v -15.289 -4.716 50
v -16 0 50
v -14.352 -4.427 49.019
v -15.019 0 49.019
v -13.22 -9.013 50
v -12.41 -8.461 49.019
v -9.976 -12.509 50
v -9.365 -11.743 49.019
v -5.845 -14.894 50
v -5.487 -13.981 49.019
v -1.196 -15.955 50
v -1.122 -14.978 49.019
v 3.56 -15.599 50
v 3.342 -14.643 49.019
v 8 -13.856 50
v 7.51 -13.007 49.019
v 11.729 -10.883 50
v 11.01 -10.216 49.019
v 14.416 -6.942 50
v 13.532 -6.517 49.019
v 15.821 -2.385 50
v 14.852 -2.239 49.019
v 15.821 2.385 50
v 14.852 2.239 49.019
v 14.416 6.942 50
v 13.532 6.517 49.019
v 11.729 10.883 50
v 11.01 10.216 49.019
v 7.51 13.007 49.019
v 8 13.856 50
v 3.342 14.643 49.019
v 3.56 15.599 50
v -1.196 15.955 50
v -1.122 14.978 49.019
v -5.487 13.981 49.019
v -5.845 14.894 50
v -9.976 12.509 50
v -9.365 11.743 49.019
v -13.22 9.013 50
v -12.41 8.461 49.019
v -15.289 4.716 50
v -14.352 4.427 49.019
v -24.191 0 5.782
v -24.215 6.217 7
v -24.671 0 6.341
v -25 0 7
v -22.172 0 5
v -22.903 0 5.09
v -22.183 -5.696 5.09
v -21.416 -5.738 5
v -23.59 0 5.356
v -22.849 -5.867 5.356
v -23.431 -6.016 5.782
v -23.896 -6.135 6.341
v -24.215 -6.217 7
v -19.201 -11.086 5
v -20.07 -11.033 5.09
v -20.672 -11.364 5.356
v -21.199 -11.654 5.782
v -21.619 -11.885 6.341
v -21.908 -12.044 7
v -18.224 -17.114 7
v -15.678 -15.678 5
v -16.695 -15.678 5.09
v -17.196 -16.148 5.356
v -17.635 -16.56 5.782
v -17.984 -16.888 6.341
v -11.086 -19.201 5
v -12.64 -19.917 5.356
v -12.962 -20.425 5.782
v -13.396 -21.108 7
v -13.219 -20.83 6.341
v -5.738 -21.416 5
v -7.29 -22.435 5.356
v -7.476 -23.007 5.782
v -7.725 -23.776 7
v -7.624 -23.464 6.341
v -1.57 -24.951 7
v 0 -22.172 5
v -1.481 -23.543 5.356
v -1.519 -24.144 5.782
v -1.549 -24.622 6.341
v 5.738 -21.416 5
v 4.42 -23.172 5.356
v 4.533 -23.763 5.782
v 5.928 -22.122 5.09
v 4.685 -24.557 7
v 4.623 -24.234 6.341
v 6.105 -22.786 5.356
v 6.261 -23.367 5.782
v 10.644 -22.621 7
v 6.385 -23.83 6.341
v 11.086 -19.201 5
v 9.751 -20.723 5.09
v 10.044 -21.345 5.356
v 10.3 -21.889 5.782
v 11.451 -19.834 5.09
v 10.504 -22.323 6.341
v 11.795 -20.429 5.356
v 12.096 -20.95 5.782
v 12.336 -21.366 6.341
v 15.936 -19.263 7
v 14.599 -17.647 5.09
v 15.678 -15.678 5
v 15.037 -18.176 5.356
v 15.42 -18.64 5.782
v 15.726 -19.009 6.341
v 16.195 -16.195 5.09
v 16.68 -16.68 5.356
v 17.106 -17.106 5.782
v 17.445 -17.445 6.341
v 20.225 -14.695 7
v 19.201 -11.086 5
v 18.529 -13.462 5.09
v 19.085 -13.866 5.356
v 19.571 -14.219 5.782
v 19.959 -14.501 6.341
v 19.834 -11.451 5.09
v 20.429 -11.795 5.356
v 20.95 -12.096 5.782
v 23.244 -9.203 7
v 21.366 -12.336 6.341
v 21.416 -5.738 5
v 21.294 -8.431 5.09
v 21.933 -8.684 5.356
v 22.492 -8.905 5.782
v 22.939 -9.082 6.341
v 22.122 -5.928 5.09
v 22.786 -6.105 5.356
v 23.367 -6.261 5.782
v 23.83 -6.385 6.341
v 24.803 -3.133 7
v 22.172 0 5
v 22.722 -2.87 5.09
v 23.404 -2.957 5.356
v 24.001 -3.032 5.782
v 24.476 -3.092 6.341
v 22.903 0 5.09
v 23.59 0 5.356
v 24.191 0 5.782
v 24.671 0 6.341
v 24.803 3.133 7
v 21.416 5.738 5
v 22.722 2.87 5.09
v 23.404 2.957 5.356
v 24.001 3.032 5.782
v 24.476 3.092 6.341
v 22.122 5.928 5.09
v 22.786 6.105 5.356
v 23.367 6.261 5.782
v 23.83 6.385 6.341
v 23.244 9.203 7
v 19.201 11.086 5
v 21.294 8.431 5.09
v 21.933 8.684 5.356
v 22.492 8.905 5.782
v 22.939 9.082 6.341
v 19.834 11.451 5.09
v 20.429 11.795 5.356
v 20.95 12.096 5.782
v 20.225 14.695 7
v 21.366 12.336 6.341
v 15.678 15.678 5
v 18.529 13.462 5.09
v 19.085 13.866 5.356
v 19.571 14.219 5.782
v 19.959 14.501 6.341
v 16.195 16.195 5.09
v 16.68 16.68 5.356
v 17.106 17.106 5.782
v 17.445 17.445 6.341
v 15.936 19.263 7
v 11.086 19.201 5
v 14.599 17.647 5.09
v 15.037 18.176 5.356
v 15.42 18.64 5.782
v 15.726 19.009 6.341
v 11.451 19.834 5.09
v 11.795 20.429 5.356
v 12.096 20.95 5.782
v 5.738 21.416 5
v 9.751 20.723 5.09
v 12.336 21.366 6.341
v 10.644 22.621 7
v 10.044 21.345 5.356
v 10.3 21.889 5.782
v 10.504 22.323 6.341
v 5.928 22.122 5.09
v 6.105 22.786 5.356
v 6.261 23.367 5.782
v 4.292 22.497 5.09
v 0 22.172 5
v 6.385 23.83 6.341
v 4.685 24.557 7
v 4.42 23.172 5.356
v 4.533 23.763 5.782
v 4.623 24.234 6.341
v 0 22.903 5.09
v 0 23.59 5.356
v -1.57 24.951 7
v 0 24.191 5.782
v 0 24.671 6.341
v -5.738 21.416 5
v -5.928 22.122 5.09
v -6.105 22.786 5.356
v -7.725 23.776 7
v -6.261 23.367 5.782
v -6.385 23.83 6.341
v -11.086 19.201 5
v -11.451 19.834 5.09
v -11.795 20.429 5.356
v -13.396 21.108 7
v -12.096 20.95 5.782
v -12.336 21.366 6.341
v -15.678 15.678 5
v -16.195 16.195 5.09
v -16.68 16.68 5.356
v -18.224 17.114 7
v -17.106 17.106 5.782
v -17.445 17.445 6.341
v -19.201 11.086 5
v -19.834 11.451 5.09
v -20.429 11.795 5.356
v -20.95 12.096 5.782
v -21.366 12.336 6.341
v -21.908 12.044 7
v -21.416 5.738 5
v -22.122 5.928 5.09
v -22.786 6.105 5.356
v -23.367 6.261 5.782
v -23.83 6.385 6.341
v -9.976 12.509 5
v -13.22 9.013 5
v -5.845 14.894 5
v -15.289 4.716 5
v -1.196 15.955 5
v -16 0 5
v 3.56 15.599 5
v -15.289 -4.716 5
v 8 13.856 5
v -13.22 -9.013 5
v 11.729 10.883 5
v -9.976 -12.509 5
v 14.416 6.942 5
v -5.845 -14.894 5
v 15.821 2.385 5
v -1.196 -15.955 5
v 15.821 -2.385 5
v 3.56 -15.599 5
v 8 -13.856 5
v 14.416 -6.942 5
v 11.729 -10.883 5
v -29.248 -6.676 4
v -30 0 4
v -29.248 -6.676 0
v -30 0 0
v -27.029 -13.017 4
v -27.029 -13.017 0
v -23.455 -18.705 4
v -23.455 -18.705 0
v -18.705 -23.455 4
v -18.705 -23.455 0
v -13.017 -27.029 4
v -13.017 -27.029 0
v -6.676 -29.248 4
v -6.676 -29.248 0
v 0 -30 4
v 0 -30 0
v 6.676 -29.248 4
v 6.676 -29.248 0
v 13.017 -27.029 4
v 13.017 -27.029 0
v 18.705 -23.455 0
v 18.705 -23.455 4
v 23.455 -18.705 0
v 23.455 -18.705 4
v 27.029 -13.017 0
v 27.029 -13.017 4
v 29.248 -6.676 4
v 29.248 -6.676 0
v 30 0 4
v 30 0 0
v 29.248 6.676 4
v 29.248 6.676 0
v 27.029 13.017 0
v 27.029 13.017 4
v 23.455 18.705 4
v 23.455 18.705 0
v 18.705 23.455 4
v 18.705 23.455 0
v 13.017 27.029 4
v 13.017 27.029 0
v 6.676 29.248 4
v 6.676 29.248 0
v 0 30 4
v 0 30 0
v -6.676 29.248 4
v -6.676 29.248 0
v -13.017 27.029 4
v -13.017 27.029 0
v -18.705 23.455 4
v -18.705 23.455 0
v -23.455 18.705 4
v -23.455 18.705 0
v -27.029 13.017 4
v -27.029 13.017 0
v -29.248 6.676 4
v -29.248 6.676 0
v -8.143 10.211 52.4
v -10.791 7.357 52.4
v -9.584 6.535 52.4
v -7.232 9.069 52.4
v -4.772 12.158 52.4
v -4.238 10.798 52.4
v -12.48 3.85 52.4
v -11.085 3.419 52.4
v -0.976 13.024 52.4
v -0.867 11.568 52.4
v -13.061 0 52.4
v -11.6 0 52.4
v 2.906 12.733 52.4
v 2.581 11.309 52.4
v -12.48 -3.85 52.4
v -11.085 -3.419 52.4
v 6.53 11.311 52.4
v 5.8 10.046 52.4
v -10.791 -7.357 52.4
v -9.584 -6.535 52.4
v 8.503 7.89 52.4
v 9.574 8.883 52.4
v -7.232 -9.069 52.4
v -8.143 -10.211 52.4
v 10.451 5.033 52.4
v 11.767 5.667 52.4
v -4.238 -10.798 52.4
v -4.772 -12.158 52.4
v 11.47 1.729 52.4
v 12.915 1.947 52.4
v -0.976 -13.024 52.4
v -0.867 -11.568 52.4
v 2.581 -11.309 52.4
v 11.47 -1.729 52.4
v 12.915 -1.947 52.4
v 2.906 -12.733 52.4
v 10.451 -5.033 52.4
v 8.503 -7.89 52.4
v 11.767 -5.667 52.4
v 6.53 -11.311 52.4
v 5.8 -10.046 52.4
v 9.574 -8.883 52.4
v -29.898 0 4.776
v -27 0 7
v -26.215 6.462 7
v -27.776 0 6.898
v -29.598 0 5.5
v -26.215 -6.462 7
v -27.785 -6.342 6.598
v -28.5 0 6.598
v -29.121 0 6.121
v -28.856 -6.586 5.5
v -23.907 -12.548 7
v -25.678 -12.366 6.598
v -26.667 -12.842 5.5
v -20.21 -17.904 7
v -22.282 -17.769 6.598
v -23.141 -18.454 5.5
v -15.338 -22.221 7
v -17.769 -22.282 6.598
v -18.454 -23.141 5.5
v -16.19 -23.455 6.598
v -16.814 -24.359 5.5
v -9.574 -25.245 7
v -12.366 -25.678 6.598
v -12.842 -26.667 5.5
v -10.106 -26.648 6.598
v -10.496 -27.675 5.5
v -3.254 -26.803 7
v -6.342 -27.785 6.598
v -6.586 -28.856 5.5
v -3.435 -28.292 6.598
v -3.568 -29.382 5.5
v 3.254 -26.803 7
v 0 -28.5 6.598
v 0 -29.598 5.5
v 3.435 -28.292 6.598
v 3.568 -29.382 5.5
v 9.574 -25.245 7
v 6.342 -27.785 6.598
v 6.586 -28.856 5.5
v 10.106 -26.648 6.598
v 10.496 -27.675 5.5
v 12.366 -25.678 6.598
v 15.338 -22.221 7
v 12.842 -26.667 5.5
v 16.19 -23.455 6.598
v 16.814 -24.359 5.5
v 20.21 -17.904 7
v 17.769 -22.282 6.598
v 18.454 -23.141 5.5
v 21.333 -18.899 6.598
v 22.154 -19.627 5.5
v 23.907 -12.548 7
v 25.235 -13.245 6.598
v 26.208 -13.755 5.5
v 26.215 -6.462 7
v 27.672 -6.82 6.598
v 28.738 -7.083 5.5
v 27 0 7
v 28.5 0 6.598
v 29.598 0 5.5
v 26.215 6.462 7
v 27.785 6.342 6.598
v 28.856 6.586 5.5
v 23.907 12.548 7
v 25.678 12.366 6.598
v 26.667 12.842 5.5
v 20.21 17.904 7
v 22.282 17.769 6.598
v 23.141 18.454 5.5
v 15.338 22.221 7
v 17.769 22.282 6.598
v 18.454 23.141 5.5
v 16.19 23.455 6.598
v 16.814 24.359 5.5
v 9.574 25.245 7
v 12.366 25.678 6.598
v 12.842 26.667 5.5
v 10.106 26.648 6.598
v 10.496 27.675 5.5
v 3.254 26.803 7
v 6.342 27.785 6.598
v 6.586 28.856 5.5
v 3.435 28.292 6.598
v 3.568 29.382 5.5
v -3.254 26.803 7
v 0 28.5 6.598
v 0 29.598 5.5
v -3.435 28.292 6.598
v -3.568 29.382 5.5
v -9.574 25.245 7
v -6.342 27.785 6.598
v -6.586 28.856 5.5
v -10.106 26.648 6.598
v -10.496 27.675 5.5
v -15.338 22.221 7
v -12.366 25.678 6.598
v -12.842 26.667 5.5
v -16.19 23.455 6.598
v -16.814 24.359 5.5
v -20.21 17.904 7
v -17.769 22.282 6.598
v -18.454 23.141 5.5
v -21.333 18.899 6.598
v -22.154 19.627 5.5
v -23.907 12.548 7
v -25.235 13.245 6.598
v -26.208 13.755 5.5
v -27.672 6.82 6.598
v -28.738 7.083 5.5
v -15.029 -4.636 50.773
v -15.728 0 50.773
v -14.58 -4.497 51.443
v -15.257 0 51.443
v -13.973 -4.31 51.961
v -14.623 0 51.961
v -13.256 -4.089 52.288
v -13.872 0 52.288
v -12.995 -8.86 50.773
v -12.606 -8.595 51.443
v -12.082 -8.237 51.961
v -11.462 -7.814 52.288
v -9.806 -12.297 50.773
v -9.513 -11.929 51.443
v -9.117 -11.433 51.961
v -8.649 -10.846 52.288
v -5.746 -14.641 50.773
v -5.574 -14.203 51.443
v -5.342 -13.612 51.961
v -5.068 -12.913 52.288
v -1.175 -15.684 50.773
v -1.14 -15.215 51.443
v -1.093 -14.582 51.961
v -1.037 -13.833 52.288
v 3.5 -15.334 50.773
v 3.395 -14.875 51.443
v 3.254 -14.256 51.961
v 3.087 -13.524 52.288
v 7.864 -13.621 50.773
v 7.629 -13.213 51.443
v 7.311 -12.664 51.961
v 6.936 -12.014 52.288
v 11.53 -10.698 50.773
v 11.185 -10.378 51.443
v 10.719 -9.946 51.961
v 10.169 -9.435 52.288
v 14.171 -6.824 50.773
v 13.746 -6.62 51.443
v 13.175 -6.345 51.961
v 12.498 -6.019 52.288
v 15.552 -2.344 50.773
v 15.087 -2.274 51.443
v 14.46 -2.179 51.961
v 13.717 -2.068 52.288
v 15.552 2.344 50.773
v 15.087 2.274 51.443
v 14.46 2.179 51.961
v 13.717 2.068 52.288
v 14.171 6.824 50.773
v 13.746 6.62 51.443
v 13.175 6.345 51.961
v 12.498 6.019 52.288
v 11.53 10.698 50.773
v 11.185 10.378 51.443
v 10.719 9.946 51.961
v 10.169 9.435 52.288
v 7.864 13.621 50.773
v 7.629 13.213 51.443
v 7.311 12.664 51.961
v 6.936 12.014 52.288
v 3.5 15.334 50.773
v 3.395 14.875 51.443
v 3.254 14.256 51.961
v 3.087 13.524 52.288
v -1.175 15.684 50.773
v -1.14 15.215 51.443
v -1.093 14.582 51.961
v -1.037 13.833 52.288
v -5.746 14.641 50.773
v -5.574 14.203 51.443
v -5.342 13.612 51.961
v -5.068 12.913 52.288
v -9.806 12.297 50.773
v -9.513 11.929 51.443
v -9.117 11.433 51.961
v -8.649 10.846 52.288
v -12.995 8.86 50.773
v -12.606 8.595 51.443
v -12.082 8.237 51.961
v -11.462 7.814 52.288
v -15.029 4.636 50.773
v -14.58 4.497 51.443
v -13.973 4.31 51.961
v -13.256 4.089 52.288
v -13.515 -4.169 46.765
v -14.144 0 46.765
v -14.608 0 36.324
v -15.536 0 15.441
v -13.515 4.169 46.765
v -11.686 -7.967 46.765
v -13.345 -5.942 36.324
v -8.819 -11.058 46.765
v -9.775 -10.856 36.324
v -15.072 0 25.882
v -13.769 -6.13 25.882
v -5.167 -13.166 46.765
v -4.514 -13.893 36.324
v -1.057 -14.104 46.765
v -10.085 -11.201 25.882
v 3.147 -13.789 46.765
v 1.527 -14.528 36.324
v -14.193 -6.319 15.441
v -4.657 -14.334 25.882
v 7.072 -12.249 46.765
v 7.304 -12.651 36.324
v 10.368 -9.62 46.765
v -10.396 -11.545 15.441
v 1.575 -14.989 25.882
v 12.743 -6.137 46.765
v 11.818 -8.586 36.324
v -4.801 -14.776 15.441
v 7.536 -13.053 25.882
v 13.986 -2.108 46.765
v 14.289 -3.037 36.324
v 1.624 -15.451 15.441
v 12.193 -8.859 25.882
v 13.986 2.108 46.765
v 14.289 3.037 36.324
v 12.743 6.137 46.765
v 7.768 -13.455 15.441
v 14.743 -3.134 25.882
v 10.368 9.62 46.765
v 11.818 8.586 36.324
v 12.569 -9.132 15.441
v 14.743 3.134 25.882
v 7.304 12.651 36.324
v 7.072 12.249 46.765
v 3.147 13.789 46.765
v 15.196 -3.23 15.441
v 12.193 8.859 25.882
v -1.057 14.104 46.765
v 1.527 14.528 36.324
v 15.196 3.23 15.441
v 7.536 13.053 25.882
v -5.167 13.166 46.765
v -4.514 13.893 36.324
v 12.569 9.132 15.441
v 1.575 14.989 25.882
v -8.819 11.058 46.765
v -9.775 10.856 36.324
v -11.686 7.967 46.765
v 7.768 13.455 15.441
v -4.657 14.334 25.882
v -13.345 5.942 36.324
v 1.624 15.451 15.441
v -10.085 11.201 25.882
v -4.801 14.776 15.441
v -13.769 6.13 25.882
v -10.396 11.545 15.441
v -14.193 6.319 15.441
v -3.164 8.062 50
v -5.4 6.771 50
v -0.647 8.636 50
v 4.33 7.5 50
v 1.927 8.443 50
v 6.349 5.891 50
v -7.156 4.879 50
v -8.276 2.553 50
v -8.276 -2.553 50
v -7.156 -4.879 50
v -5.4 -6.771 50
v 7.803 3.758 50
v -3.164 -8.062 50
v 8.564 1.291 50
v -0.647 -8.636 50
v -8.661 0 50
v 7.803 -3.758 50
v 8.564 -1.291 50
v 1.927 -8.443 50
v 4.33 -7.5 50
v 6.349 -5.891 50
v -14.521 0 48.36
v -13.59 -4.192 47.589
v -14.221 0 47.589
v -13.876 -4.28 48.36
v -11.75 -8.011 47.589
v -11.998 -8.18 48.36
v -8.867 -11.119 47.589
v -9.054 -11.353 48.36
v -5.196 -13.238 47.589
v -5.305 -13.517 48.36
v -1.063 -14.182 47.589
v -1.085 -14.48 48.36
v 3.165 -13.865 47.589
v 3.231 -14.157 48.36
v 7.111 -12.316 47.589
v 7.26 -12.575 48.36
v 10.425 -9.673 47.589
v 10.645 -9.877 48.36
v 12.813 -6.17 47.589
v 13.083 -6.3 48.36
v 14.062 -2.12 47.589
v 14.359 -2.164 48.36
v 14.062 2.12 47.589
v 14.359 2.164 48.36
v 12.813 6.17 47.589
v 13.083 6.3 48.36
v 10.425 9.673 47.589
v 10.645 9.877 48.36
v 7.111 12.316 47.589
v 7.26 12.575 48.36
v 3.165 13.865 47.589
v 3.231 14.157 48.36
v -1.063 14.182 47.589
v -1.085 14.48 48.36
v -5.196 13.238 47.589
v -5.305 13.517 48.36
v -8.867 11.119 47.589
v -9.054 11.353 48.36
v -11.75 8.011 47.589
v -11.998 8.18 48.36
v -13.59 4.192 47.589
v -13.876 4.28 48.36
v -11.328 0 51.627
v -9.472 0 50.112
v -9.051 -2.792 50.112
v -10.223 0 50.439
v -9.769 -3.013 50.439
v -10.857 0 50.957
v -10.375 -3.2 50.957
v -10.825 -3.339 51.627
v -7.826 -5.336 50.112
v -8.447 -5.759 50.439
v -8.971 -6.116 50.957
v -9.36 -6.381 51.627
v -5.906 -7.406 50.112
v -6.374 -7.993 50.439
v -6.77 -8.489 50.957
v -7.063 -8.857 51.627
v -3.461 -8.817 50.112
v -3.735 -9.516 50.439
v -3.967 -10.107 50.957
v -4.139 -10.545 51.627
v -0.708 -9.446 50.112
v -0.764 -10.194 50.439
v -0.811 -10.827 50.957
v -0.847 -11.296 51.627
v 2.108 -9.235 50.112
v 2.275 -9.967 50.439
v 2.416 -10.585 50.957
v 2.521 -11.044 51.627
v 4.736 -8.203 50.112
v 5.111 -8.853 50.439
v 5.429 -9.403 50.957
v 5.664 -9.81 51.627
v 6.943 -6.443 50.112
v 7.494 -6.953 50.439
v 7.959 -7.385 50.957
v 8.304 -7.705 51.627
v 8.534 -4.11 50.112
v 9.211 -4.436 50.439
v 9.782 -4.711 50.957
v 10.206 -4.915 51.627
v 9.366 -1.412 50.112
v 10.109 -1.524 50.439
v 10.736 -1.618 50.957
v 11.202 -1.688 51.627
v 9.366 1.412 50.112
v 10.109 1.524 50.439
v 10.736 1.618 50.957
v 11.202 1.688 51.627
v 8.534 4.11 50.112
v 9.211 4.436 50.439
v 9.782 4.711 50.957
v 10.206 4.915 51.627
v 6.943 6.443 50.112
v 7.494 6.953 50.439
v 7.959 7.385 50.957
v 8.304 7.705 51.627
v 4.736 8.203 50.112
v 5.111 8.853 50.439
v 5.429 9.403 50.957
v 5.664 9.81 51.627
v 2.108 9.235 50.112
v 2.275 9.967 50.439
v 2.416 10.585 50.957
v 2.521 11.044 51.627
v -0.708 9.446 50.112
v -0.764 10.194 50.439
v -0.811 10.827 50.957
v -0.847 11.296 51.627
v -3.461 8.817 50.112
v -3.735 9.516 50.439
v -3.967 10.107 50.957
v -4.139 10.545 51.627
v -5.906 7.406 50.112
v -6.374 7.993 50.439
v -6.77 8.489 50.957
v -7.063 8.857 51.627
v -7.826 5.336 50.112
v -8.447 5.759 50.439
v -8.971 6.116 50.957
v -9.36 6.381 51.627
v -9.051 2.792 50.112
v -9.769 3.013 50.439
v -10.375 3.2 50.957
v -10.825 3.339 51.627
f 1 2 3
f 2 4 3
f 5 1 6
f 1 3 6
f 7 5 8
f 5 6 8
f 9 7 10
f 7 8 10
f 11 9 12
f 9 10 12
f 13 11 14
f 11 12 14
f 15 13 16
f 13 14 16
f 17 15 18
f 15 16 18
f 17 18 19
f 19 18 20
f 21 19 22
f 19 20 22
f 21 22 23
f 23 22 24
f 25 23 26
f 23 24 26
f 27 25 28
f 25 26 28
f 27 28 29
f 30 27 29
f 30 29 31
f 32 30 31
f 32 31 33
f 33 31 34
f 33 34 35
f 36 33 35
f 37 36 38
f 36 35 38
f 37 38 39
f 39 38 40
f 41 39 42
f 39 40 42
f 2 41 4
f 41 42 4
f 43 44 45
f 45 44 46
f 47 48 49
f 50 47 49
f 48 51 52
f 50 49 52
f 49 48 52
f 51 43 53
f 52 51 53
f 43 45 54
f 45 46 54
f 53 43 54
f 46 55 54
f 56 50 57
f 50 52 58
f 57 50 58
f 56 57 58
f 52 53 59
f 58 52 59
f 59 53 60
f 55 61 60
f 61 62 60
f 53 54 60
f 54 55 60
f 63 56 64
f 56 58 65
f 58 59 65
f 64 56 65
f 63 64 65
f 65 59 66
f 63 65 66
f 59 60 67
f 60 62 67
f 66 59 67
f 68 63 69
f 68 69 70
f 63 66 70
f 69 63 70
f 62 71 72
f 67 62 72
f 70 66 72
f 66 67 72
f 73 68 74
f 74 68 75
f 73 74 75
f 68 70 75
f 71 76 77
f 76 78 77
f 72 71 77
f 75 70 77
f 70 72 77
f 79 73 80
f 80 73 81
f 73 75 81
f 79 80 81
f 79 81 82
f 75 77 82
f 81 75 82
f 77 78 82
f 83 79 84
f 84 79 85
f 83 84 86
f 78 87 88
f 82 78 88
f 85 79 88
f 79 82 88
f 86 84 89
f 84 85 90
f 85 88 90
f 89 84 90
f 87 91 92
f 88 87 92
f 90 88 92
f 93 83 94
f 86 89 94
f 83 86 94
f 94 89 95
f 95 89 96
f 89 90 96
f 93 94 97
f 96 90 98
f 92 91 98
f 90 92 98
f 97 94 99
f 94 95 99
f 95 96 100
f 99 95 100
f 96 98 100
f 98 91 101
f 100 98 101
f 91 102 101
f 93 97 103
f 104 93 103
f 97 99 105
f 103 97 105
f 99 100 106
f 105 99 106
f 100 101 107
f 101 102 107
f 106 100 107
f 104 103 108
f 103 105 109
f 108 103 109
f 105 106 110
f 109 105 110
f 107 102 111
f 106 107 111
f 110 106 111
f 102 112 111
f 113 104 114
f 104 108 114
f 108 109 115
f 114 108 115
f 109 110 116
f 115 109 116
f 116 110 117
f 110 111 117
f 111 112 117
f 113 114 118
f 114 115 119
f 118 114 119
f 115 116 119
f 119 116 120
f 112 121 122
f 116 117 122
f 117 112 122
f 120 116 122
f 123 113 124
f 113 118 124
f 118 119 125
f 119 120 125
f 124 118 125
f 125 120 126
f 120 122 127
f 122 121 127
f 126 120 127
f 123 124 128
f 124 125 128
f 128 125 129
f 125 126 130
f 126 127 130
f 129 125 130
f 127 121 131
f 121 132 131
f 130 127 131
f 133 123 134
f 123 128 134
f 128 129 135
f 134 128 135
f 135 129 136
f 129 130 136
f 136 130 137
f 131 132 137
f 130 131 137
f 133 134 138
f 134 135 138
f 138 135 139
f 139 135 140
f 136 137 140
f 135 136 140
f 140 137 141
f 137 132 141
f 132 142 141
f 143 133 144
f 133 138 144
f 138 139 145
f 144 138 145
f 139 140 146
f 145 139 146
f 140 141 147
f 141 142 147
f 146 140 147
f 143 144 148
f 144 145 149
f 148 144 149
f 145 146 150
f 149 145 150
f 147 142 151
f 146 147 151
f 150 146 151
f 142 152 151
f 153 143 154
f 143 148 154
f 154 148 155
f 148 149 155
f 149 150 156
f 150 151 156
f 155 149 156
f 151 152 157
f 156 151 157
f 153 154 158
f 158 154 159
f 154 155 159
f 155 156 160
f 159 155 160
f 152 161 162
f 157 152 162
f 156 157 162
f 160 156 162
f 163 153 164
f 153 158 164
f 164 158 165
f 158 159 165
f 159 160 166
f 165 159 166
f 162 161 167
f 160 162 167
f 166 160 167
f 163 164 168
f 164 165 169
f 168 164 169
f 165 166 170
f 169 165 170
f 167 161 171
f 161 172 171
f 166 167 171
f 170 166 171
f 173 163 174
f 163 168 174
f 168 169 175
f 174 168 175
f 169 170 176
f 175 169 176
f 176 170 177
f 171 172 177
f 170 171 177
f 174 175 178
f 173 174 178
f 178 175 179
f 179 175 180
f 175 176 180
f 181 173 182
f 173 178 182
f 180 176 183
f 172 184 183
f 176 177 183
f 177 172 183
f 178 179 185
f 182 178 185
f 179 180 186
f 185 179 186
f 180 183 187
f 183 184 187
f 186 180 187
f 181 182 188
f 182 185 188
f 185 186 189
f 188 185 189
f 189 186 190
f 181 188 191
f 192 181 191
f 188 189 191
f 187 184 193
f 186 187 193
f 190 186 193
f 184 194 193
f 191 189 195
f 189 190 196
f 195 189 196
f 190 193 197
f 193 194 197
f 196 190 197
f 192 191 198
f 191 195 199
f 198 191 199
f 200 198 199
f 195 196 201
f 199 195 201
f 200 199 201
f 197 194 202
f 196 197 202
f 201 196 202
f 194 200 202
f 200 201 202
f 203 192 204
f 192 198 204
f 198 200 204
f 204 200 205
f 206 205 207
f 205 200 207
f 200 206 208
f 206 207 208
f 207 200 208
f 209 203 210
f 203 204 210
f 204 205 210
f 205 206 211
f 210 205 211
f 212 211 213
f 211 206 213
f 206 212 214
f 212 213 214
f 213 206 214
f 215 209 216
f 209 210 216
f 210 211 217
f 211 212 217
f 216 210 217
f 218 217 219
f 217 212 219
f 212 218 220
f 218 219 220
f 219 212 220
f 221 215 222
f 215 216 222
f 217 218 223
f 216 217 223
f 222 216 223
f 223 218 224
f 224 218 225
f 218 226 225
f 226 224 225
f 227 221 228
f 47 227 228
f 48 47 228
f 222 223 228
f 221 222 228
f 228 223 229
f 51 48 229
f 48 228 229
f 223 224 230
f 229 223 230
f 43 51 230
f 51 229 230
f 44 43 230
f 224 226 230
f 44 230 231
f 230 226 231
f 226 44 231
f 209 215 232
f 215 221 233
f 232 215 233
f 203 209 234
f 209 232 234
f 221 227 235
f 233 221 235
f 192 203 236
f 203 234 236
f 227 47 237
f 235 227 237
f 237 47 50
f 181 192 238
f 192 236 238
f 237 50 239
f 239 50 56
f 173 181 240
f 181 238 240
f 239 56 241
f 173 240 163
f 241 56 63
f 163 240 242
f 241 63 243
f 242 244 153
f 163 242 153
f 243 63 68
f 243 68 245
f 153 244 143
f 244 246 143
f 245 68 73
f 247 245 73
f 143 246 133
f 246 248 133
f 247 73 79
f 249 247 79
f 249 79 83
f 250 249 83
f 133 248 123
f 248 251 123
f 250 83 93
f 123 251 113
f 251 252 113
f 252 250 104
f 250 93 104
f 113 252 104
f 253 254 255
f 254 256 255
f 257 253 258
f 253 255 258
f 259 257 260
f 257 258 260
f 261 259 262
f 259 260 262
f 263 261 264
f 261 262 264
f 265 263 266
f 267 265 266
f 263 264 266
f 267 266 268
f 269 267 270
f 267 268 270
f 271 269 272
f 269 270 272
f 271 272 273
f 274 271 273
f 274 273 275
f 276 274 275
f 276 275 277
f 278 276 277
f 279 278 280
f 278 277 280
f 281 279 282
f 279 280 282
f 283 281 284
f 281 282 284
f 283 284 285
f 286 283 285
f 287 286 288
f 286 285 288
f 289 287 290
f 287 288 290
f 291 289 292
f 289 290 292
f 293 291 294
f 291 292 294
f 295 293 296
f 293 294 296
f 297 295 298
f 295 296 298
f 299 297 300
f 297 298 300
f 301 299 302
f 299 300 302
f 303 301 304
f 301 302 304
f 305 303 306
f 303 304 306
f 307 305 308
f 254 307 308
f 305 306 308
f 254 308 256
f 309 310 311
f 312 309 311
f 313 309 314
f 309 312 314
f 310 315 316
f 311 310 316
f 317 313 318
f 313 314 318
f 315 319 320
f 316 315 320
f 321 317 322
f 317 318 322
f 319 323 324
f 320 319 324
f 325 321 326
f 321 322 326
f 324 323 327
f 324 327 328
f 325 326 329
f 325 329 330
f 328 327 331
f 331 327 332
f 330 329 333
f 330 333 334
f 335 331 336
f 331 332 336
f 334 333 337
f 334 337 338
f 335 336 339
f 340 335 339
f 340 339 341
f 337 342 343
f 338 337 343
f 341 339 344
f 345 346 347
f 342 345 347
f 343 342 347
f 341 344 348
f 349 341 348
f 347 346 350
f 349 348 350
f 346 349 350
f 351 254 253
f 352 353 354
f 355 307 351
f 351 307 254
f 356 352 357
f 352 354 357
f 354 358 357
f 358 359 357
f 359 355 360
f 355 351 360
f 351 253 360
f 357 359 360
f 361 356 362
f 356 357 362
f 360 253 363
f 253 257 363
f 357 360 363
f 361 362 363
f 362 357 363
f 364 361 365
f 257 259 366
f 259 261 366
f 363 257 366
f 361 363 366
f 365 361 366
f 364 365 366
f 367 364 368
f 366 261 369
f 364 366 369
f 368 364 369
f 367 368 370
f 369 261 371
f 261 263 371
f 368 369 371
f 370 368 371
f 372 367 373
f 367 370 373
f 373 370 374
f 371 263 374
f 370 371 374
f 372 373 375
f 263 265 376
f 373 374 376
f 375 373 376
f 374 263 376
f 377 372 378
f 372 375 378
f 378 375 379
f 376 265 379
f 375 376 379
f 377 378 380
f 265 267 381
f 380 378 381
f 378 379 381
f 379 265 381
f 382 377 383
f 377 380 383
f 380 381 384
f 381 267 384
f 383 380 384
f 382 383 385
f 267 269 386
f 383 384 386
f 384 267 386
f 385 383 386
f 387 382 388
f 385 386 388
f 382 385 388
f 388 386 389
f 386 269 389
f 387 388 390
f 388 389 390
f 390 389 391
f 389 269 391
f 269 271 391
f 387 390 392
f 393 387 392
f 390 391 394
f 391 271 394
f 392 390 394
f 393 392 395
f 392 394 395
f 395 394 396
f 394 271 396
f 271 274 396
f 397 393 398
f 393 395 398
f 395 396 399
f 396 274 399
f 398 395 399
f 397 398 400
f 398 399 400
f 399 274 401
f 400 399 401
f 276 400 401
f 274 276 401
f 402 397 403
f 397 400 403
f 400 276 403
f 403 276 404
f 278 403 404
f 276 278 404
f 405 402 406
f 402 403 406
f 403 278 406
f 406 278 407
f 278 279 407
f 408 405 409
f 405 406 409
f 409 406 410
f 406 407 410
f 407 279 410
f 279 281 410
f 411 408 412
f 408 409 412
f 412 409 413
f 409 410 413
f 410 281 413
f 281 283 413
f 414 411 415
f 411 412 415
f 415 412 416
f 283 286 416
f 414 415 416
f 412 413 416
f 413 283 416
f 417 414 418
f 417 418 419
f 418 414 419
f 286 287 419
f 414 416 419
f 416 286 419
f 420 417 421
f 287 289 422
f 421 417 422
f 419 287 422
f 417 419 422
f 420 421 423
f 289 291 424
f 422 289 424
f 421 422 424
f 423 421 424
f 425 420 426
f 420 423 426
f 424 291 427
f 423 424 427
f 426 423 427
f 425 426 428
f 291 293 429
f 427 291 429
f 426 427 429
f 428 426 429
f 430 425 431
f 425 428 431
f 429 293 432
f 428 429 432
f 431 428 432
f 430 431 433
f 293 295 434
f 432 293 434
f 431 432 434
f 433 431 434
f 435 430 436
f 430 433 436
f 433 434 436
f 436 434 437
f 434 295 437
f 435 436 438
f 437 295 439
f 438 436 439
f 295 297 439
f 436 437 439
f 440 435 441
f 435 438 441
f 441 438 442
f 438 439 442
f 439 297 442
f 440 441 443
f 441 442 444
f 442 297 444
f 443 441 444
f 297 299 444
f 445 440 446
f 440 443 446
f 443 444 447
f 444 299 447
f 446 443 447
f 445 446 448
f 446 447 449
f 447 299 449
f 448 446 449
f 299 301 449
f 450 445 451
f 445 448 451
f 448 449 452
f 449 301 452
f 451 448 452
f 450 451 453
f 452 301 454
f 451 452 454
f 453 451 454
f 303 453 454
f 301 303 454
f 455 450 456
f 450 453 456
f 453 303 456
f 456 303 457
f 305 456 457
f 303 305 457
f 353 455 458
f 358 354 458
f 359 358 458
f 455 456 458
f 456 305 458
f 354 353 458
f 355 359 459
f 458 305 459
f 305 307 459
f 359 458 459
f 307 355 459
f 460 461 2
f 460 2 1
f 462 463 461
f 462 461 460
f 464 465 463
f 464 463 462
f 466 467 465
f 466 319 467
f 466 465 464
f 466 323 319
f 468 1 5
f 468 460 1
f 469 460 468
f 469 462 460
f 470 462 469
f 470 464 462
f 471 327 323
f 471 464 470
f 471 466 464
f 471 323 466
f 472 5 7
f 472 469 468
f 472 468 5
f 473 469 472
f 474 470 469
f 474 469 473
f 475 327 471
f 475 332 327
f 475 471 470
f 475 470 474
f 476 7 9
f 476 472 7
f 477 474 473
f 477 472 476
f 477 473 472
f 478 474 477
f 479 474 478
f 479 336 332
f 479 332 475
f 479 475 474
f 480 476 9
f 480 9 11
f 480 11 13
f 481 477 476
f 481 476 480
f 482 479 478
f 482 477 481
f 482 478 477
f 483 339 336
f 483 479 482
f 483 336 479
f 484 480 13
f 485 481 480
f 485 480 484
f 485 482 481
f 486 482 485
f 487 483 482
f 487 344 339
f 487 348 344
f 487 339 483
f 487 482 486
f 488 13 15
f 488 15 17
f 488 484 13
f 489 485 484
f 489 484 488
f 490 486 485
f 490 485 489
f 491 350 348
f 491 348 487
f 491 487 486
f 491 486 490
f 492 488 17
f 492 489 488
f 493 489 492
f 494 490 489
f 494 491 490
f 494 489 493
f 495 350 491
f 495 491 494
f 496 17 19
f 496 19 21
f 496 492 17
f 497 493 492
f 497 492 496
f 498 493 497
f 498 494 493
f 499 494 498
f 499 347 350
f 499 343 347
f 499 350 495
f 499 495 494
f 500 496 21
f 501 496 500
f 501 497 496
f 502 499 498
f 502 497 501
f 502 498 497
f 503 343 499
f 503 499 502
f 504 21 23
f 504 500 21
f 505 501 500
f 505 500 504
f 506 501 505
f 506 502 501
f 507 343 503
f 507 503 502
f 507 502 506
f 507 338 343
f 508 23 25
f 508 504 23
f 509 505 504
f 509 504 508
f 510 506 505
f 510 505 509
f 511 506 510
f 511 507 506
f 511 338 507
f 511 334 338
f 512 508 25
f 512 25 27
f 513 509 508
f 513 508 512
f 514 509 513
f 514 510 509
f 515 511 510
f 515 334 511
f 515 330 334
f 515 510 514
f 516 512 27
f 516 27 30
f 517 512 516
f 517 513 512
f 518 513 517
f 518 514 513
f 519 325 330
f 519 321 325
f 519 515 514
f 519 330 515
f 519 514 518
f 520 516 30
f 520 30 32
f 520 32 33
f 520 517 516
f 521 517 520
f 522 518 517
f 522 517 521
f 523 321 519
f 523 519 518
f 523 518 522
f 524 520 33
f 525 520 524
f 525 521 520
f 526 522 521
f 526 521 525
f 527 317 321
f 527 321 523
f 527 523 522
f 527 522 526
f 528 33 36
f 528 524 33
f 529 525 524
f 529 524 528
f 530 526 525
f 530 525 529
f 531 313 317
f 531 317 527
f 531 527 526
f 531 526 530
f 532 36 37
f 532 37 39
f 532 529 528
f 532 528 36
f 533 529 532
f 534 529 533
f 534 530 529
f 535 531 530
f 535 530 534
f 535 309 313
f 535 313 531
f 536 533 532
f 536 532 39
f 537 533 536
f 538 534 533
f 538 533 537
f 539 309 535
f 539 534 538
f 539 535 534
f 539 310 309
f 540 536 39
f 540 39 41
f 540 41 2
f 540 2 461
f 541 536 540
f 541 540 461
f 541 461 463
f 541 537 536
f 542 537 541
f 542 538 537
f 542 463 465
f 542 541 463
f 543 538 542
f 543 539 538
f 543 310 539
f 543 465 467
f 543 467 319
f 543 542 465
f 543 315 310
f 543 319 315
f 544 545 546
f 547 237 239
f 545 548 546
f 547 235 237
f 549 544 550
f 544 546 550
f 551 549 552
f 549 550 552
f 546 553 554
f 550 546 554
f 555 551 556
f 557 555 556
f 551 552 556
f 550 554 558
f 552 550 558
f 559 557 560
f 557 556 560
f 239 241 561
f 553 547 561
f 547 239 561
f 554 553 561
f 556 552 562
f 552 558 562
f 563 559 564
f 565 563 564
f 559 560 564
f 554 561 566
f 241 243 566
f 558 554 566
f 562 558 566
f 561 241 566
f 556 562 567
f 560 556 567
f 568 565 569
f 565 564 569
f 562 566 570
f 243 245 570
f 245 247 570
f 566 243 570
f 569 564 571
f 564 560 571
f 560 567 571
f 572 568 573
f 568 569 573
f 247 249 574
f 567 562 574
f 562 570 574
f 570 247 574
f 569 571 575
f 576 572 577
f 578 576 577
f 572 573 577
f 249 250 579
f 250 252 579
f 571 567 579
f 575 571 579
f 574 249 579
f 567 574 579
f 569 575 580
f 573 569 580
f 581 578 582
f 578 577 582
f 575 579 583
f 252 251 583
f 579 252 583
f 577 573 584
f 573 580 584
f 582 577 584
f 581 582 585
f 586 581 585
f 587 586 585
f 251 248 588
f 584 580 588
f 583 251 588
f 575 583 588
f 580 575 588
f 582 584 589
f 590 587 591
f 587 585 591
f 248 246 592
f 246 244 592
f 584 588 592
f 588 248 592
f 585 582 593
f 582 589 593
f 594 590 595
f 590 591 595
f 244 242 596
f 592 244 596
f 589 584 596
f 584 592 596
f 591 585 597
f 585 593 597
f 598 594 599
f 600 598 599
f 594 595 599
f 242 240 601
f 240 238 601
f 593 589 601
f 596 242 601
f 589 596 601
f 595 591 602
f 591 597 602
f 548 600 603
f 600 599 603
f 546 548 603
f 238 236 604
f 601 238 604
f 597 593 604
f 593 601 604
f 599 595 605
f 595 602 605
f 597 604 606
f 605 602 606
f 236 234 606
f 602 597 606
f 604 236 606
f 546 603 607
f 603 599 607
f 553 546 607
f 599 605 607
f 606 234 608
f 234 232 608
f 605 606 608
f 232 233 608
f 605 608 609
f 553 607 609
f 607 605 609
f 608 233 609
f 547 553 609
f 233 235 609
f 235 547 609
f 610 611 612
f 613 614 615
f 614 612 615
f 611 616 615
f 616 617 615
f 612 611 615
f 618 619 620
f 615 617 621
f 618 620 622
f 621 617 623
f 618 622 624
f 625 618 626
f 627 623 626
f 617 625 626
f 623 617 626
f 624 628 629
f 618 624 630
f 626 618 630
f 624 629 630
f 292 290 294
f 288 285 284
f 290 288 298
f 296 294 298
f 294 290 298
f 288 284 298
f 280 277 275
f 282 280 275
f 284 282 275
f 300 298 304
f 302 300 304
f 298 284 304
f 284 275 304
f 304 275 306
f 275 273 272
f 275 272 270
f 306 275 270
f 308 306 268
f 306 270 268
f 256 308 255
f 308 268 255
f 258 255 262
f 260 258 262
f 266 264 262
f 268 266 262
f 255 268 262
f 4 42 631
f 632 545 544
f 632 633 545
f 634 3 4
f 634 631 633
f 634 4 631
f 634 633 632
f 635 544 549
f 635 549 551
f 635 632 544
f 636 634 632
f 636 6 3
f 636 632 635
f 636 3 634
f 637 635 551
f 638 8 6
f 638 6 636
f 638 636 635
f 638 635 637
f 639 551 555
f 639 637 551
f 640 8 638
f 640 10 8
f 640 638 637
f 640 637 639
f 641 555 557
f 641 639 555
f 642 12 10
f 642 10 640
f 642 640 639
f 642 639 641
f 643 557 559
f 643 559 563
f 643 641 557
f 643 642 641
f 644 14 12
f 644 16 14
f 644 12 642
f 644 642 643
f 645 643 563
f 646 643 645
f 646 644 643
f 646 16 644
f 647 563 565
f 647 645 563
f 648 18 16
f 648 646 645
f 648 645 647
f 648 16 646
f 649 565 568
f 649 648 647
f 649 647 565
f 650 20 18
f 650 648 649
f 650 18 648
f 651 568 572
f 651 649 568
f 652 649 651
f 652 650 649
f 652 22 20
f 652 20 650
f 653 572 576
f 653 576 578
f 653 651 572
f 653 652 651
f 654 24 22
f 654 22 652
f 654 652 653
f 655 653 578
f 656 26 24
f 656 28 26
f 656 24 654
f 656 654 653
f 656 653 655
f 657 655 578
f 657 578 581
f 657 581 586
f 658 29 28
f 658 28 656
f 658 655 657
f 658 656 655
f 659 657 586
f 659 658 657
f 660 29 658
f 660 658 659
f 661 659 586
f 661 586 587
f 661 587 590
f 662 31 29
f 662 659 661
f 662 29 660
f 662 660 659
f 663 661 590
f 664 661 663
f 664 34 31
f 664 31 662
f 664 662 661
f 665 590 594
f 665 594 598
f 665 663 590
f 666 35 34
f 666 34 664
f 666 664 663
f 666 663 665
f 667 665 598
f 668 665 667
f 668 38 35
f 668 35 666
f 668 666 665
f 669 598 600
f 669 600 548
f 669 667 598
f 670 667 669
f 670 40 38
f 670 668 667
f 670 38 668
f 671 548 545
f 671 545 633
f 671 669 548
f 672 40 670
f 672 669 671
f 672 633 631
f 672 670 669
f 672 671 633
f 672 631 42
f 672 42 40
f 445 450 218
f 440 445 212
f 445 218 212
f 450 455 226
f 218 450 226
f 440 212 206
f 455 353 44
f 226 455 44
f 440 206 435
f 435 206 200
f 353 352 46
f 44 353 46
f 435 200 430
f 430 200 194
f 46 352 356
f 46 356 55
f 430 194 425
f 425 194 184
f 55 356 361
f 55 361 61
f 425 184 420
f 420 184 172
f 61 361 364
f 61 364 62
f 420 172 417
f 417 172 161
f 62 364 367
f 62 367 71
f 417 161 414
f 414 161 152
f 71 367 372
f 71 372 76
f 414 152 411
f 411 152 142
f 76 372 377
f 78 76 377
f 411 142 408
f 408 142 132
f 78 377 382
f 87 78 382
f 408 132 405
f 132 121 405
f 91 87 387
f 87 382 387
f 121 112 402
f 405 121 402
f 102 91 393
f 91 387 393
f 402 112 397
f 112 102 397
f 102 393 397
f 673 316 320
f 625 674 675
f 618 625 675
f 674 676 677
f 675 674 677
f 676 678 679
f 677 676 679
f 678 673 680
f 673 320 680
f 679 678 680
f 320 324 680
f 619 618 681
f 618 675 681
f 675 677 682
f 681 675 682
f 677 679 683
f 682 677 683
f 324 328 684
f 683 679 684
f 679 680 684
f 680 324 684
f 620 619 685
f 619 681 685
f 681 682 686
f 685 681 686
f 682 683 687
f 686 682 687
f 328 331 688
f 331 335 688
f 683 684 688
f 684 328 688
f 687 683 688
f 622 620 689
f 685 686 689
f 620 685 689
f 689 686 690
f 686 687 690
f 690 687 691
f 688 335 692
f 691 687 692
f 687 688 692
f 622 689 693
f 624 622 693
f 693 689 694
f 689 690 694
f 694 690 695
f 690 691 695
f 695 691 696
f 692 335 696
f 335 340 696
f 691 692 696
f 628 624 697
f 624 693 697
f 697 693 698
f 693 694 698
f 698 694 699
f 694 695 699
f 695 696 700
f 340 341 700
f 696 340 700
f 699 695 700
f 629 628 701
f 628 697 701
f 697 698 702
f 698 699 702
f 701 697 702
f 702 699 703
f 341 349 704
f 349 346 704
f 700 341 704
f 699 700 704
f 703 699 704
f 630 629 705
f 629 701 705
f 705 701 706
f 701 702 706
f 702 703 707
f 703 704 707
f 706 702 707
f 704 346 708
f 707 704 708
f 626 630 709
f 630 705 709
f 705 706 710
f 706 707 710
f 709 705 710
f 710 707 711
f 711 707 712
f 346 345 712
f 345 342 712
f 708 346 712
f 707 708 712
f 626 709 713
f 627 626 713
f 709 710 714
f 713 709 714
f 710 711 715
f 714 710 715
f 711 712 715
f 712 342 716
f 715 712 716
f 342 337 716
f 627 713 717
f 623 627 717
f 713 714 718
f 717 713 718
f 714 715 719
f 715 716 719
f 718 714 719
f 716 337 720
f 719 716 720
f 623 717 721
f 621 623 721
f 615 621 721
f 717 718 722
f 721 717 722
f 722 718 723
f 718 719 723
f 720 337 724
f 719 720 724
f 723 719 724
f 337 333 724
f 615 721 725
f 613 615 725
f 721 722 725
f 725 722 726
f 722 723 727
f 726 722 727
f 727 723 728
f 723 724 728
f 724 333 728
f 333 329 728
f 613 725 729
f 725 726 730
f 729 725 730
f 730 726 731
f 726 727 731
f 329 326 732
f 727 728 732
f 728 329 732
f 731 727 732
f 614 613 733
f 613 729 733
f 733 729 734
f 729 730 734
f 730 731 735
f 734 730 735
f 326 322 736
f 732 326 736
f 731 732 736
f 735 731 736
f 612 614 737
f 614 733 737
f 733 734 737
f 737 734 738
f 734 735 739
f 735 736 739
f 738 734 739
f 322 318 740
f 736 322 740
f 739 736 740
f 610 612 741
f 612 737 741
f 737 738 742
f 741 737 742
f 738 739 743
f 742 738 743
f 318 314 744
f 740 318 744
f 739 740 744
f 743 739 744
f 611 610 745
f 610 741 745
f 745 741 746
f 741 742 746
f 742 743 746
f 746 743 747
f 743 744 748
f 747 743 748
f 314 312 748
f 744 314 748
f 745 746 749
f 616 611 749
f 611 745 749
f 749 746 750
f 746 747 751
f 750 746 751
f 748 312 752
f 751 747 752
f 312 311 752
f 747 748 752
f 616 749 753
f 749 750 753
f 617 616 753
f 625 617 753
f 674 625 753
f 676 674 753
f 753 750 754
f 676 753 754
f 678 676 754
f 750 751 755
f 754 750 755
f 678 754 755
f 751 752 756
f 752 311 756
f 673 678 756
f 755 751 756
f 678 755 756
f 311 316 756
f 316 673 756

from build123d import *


# Not quite as in the source:
# - a fillet or chamfer that OpenCascade refuses, or shapes differently, is made with other operations: its cross-section is extruded or revolved along the edge and cut away or added


with BuildPart() as f1:
    # F0 (on Front) → F1 (revolve)
    with BuildSketch(Plane.XZ):
        Polygon((-30, 7), (-30, 0), (0, 0), (0, 50), (-11.6, 50), (-11.6, 52.4), (-16, 52.4), (-16, 50), (-14.085106383, 48.085106383), (-16, 5), (-25, 5), (-25, 7), align=None)
    revolve(axis=Axis((0, 0, 15.8572417056), (0, 0, 1)))

    # F2: fillet of radius 3 on 5 edges, made by hand

    # F2_s1 → F2_t2 (revolve)
    with BuildSketch(Plane.XZ):
        with BuildLine():
            ThreePointArc((-22.1715728753, 5), (-23.9036236828, 5.5505102572), (-25, 7))
            Line((-25, 7), (-25, 5))
            Line((-25, 5), (-22.1715728753, 5))
        make_face()
    revolve(axis=Axis((0, 0, 5), (0, 0, 1)))

    # F2_s3 → F2_t4 (revolve)
    with BuildSketch(Plane.XZ):
        with BuildLine():
            ThreePointArc((-14.1437787706, 46.764977662), (-14.3443716648, 47.9844003118), (-15.0194998464, 49.0194998464))
            Line((-15.0194998464, 49.0194998464), (-14.085106383, 48.085106383))
            Line((-14.085106383, 48.085106383), (-14.1437787706, 46.764977662))
        make_face()
    revolve(axis=Axis((0, 0, 48.085106383), (0, 0, 1)))

    # F2_s5 → F2_t6 (revolve)
    with BuildSketch(Plane.XZ):
        with BuildLine():
            ThreePointArc((-8.6606123087, 50), (-10.5579789048, 50.6762099923), (-11.6, 52.4))
            Line((-11.6, 52.4), (-11.6, 50))
            Line((-11.6, 50), (-8.6606123087, 50))
        make_face()
    revolve(axis=Axis((0, 0, 50), (0, 0, 1)))

    # F2_s7 → F2_t8 (revolve, cut)
    with BuildSketch(Plane.XZ):
        with BuildLine():
            ThreePointArc((-27, 7), (-29.1213203436, 6.1213203436), (-30, 4))
            Line((-30, 4), (-30, 7))
            Line((-30, 7), (-27, 7))
        make_face()
    revolve(axis=Axis((0, 0, 7), (0, 0, 1)), mode=Mode.SUBTRACT)

    # F2_s9 → F2_t10 (revolve, cut)
    with BuildSketch(Plane.XZ):
        with BuildLine():
            ThreePointArc((-16, 50), (-14.9579789048, 51.7237900077), (-13.0606123087, 52.4))
            Line((-13.0606123087, 52.4), (-16, 52.4))
            Line((-16, 52.4), (-16, 50))
        make_face()
    revolve(axis=Axis((0, 0, 52.4), (0, 0, 1)), mode=Mode.SUBTRACT)


solid = f1.part
